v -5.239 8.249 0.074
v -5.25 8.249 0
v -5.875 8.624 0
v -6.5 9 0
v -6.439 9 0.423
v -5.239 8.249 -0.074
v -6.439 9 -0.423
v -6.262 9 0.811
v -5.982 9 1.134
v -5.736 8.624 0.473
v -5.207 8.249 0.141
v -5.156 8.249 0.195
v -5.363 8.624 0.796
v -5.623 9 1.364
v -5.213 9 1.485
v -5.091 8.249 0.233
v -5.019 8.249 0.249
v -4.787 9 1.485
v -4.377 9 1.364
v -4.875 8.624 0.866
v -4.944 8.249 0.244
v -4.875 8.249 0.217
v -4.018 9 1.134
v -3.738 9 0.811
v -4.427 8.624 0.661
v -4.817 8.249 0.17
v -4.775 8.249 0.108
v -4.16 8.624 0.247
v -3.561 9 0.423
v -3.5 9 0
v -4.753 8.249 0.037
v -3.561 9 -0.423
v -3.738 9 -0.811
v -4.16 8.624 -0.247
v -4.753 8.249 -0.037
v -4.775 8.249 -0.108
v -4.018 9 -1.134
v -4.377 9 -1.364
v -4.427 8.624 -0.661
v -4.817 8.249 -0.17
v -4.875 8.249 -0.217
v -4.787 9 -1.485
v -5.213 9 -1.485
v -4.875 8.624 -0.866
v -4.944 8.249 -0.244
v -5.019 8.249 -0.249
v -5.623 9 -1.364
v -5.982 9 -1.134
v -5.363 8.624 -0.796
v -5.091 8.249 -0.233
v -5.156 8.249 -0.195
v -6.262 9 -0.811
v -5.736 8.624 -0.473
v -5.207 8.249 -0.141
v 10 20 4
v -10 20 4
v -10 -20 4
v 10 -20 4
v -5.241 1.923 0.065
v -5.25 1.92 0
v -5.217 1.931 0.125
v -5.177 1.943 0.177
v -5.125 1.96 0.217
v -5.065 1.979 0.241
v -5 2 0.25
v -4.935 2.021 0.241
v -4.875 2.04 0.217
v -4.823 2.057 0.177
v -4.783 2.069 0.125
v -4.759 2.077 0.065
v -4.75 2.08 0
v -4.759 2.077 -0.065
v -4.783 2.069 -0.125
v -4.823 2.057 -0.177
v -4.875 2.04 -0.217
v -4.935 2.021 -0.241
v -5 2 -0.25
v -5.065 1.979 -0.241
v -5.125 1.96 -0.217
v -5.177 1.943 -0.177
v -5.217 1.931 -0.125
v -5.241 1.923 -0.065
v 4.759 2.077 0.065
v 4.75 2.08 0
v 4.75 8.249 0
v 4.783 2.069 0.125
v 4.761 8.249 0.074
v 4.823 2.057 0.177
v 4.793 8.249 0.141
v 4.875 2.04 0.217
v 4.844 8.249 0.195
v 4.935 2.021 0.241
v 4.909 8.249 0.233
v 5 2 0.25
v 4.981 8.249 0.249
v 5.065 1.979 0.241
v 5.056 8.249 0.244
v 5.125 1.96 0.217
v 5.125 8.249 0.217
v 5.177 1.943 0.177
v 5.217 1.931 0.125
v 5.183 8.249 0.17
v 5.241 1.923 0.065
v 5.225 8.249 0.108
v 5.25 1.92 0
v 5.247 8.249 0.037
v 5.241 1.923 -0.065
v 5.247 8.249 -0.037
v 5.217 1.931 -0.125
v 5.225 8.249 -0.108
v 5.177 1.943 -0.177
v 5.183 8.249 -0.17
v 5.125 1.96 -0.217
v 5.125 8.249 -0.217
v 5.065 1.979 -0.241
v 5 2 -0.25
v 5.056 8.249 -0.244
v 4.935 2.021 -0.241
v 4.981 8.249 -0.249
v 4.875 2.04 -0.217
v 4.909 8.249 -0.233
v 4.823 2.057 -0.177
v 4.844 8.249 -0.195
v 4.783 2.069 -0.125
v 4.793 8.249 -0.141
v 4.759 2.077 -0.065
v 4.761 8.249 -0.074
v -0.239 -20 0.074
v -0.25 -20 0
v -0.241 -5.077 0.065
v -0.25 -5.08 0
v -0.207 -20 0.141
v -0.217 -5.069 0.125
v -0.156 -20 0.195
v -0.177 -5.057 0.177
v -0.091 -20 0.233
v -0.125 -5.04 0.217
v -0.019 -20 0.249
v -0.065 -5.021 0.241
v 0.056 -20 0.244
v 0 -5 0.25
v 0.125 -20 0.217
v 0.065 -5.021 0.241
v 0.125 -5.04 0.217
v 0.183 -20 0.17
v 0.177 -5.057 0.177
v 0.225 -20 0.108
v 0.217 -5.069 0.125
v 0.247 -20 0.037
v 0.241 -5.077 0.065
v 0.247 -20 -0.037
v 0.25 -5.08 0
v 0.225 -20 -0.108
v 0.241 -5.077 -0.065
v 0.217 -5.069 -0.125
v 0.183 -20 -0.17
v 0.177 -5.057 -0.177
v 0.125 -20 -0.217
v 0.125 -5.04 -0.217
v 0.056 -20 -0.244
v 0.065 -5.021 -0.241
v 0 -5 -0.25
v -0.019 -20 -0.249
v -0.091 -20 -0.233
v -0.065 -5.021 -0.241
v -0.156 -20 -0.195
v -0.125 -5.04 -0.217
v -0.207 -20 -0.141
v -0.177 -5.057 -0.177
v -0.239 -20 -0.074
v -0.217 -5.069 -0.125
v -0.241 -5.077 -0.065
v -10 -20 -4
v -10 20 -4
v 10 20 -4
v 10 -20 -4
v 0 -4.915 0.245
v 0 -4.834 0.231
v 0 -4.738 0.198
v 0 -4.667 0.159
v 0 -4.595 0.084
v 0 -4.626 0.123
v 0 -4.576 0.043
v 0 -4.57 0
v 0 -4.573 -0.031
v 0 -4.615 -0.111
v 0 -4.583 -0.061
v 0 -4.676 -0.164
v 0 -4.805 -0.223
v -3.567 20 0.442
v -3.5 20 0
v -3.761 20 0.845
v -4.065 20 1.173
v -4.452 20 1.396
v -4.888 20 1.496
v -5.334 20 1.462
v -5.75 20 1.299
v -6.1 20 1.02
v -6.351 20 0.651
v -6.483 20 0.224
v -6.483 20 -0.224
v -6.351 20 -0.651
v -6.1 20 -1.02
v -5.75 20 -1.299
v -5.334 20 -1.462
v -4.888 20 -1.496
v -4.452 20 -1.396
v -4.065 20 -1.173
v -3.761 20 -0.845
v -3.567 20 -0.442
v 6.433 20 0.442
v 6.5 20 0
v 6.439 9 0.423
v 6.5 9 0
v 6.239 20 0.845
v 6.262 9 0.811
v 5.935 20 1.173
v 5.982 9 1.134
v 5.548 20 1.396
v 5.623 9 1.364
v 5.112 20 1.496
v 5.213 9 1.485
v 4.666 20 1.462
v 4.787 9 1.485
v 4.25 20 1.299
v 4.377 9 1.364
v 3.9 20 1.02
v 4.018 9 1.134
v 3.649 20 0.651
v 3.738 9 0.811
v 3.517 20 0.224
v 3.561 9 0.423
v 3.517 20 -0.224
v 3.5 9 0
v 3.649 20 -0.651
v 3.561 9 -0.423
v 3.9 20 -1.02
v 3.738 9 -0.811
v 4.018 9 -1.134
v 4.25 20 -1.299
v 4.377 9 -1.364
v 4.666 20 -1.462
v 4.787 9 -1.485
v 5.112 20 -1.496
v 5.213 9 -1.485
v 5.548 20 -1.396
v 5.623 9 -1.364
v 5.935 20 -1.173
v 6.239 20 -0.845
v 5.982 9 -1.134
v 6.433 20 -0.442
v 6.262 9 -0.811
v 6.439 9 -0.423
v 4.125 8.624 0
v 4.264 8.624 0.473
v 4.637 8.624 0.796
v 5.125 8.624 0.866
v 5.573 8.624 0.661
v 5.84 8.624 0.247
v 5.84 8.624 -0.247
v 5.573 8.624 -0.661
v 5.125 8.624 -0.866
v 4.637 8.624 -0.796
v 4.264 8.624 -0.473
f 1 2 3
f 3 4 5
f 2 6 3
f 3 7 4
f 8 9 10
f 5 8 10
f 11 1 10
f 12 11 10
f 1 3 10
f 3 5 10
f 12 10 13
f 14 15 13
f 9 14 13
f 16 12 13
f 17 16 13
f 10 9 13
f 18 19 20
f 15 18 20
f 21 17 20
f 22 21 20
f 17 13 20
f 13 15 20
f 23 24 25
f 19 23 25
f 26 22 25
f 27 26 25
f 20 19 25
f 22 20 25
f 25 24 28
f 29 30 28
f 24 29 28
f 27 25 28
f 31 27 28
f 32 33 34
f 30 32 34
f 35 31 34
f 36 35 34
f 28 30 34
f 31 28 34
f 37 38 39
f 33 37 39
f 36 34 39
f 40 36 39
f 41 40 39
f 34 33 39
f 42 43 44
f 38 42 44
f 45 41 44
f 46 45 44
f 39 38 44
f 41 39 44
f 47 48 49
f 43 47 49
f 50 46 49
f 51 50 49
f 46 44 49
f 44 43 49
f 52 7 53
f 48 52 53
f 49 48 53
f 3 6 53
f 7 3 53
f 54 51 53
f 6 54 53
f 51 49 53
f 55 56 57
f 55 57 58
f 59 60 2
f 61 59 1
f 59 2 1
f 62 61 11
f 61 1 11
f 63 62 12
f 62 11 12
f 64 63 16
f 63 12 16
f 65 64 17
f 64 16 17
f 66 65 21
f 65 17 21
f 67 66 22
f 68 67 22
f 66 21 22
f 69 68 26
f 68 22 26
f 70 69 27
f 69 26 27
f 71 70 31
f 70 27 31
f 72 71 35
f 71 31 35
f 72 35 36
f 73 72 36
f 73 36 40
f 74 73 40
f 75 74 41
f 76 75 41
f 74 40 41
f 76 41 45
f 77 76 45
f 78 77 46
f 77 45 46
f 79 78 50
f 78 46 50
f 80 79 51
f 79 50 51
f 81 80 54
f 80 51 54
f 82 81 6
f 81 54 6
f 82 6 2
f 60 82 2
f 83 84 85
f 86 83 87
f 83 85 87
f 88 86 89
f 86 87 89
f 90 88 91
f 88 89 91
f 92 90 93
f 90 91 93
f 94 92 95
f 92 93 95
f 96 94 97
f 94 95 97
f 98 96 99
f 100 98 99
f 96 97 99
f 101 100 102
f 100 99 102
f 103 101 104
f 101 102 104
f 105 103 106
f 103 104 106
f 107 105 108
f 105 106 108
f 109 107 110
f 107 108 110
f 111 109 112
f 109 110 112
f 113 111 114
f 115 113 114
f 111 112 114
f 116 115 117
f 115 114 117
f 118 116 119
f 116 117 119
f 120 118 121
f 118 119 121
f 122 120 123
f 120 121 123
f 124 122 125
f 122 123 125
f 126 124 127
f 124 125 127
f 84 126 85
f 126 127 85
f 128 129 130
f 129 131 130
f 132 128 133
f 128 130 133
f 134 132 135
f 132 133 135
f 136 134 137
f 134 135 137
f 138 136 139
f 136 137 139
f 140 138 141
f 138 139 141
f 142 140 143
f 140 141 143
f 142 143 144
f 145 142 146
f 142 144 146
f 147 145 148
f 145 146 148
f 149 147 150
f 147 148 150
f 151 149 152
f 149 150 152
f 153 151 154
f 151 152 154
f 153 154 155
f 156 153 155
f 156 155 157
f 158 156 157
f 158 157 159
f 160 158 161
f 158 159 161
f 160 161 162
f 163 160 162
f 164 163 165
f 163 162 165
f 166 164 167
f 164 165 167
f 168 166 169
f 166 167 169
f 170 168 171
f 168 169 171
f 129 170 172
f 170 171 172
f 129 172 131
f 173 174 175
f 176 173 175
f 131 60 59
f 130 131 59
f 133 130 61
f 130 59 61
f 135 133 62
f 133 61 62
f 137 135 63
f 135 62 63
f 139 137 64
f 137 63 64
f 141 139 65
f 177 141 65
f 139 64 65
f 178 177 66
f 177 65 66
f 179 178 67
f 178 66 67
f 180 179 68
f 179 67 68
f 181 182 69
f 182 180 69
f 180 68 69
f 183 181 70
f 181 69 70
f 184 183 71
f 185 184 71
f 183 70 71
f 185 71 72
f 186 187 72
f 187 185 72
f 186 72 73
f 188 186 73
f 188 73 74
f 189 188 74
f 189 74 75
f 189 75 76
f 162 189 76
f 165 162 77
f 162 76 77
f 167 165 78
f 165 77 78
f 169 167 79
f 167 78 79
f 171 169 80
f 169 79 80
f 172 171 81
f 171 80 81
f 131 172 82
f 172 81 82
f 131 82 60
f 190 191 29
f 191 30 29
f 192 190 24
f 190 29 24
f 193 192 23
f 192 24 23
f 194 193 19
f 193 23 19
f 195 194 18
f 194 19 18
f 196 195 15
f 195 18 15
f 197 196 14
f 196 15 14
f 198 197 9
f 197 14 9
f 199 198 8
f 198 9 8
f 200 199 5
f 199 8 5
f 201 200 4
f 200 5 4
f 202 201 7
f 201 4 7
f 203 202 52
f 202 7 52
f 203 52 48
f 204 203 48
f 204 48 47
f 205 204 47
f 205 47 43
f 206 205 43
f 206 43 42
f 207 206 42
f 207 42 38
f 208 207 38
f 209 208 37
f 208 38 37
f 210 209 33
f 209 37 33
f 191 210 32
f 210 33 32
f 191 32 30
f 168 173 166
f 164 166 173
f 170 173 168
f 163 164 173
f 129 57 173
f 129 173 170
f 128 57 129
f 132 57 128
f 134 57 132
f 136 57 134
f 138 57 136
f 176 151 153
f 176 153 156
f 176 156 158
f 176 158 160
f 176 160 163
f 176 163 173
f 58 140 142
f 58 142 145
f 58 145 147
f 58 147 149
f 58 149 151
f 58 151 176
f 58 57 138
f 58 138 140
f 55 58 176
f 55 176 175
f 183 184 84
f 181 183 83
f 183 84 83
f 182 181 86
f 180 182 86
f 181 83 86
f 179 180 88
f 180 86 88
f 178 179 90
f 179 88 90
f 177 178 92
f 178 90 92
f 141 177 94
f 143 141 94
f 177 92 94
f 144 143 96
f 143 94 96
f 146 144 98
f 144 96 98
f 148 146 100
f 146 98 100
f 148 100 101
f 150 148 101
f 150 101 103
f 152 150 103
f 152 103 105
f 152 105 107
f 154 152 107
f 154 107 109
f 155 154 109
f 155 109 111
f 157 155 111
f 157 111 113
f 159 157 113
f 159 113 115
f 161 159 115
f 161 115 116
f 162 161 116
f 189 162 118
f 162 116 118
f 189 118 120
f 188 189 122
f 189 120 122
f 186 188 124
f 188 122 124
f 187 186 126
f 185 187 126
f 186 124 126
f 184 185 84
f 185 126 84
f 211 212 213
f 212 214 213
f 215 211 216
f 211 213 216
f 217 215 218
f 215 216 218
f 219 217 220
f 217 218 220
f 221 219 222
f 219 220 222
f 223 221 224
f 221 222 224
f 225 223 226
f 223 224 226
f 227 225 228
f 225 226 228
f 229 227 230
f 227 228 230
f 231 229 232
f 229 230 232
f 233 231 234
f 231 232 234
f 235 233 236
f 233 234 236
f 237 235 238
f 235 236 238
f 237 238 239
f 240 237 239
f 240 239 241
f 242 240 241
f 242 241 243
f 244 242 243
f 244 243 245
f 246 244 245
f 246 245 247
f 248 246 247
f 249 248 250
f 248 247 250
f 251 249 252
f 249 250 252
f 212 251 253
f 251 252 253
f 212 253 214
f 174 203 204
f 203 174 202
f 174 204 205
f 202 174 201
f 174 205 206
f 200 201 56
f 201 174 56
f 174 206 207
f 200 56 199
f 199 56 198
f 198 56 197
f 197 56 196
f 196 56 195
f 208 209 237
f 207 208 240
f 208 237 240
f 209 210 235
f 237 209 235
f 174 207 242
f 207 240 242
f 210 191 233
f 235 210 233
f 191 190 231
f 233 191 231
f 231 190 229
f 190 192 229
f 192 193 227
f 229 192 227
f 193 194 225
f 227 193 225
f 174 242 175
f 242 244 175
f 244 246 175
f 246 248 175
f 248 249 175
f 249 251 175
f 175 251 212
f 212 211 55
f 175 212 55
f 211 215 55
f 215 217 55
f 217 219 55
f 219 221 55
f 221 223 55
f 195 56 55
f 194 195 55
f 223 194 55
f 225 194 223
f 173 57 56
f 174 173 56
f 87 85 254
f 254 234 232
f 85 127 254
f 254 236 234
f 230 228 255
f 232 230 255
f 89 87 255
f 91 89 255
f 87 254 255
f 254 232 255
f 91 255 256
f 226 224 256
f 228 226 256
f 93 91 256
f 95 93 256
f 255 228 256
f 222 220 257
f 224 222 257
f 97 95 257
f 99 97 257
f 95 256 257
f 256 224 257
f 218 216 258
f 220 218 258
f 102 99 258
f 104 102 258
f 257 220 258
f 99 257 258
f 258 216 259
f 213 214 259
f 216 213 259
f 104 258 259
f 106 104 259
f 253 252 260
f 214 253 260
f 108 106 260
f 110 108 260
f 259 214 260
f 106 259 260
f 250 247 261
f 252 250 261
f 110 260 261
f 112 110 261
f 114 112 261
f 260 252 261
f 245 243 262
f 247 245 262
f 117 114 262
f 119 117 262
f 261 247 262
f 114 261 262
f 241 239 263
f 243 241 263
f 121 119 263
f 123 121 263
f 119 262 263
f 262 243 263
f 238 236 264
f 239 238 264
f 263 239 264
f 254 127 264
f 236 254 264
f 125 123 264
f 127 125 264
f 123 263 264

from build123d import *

# Parameters (mm, degrees)
F0_W          = 20
F0_H          = 40
F1_DEPTH      = 4
F1_DEPTH_BACK = 4
F3_R          = 0.25
F6_R          = 0.25
F10_D         = 3
F10_DEPTH     = 11
F10_TIP       = 0.9012909285
F11_D         = 3
F11_DEPTH     = 11
F11_TIP       = 0.9012909285


with BuildPart() as f1:
    # F0 (on Top) → F1 (new body, two sides)
    with BuildSketch(Plane.XY) as f1_sk:
        Rectangle(F0_W, F0_H)
    extrude(amount=F1_DEPTH)
    extrude(f1_sk.sketch, amount=-F1_DEPTH_BACK)

    # F4: sweep along a path in F2
    with BuildLine(Plane.XY) as f4_path:
        Line((0, -20), (0, -5))
        Line((0, -5), (5, 2))
        Line((5, 2), (5, 20))
    # F3 (on face) → F4 (sweep, cut)
    with BuildSketch(Plane(origin=(0, 20, 0), x_dir=(-1, 0, 0), z_dir=(0, 1, 0))):
        with Locations((-5, 0)):
            Circle(F3_R)
    sweep(path=f4_path.line, transition=Transition.RIGHT, mode=Mode.SUBTRACT)

    # F7: sweep along a path in F5
    with BuildLine(Plane.XY) as f7_path:
        Line((0, -5), (-5, 2))
        Line((-5, 2), (-5, 20))
    # F6 (on face) → F7 (sweep, cut)
    with BuildSketch(Plane(origin=(0, 20, 0), x_dir=(-1, 0, 0), z_dir=(0, 1, 0))):
        with Locations((5, 0)):
            Circle(F6_R)
    sweep(path=f7_path.line, transition=Transition.RIGHT, mode=Mode.SUBTRACT)

    # F10
    with Locations(Plane(origin=(0, 20, 0), x_dir=(-1, 0, 0), z_dir=(0, 1, 0))):
        with Locations((-5, 0)):
            Hole(F10_D / 2, depth=F10_DEPTH)
            with Locations((0, 0, -(F10_DEPTH + F10_TIP / 2))):  # 118° drill point
                Cone(0, F10_D / 2, F10_TIP, mode=Mode.SUBTRACT)

    # F11
    with Locations(Plane(origin=(0, 20, 0), x_dir=(-1, 0, 0), z_dir=(0, 1, 0))):
        with Locations((5, 0)):
            Hole(F11_D / 2, depth=F11_DEPTH)
            with Locations((0, 0, -(F11_DEPTH + F11_TIP / 2))):  # 118° drill point
                Cone(0, F11_D / 2, F11_TIP, mode=Mode.SUBTRACT)


solid = f1.part
